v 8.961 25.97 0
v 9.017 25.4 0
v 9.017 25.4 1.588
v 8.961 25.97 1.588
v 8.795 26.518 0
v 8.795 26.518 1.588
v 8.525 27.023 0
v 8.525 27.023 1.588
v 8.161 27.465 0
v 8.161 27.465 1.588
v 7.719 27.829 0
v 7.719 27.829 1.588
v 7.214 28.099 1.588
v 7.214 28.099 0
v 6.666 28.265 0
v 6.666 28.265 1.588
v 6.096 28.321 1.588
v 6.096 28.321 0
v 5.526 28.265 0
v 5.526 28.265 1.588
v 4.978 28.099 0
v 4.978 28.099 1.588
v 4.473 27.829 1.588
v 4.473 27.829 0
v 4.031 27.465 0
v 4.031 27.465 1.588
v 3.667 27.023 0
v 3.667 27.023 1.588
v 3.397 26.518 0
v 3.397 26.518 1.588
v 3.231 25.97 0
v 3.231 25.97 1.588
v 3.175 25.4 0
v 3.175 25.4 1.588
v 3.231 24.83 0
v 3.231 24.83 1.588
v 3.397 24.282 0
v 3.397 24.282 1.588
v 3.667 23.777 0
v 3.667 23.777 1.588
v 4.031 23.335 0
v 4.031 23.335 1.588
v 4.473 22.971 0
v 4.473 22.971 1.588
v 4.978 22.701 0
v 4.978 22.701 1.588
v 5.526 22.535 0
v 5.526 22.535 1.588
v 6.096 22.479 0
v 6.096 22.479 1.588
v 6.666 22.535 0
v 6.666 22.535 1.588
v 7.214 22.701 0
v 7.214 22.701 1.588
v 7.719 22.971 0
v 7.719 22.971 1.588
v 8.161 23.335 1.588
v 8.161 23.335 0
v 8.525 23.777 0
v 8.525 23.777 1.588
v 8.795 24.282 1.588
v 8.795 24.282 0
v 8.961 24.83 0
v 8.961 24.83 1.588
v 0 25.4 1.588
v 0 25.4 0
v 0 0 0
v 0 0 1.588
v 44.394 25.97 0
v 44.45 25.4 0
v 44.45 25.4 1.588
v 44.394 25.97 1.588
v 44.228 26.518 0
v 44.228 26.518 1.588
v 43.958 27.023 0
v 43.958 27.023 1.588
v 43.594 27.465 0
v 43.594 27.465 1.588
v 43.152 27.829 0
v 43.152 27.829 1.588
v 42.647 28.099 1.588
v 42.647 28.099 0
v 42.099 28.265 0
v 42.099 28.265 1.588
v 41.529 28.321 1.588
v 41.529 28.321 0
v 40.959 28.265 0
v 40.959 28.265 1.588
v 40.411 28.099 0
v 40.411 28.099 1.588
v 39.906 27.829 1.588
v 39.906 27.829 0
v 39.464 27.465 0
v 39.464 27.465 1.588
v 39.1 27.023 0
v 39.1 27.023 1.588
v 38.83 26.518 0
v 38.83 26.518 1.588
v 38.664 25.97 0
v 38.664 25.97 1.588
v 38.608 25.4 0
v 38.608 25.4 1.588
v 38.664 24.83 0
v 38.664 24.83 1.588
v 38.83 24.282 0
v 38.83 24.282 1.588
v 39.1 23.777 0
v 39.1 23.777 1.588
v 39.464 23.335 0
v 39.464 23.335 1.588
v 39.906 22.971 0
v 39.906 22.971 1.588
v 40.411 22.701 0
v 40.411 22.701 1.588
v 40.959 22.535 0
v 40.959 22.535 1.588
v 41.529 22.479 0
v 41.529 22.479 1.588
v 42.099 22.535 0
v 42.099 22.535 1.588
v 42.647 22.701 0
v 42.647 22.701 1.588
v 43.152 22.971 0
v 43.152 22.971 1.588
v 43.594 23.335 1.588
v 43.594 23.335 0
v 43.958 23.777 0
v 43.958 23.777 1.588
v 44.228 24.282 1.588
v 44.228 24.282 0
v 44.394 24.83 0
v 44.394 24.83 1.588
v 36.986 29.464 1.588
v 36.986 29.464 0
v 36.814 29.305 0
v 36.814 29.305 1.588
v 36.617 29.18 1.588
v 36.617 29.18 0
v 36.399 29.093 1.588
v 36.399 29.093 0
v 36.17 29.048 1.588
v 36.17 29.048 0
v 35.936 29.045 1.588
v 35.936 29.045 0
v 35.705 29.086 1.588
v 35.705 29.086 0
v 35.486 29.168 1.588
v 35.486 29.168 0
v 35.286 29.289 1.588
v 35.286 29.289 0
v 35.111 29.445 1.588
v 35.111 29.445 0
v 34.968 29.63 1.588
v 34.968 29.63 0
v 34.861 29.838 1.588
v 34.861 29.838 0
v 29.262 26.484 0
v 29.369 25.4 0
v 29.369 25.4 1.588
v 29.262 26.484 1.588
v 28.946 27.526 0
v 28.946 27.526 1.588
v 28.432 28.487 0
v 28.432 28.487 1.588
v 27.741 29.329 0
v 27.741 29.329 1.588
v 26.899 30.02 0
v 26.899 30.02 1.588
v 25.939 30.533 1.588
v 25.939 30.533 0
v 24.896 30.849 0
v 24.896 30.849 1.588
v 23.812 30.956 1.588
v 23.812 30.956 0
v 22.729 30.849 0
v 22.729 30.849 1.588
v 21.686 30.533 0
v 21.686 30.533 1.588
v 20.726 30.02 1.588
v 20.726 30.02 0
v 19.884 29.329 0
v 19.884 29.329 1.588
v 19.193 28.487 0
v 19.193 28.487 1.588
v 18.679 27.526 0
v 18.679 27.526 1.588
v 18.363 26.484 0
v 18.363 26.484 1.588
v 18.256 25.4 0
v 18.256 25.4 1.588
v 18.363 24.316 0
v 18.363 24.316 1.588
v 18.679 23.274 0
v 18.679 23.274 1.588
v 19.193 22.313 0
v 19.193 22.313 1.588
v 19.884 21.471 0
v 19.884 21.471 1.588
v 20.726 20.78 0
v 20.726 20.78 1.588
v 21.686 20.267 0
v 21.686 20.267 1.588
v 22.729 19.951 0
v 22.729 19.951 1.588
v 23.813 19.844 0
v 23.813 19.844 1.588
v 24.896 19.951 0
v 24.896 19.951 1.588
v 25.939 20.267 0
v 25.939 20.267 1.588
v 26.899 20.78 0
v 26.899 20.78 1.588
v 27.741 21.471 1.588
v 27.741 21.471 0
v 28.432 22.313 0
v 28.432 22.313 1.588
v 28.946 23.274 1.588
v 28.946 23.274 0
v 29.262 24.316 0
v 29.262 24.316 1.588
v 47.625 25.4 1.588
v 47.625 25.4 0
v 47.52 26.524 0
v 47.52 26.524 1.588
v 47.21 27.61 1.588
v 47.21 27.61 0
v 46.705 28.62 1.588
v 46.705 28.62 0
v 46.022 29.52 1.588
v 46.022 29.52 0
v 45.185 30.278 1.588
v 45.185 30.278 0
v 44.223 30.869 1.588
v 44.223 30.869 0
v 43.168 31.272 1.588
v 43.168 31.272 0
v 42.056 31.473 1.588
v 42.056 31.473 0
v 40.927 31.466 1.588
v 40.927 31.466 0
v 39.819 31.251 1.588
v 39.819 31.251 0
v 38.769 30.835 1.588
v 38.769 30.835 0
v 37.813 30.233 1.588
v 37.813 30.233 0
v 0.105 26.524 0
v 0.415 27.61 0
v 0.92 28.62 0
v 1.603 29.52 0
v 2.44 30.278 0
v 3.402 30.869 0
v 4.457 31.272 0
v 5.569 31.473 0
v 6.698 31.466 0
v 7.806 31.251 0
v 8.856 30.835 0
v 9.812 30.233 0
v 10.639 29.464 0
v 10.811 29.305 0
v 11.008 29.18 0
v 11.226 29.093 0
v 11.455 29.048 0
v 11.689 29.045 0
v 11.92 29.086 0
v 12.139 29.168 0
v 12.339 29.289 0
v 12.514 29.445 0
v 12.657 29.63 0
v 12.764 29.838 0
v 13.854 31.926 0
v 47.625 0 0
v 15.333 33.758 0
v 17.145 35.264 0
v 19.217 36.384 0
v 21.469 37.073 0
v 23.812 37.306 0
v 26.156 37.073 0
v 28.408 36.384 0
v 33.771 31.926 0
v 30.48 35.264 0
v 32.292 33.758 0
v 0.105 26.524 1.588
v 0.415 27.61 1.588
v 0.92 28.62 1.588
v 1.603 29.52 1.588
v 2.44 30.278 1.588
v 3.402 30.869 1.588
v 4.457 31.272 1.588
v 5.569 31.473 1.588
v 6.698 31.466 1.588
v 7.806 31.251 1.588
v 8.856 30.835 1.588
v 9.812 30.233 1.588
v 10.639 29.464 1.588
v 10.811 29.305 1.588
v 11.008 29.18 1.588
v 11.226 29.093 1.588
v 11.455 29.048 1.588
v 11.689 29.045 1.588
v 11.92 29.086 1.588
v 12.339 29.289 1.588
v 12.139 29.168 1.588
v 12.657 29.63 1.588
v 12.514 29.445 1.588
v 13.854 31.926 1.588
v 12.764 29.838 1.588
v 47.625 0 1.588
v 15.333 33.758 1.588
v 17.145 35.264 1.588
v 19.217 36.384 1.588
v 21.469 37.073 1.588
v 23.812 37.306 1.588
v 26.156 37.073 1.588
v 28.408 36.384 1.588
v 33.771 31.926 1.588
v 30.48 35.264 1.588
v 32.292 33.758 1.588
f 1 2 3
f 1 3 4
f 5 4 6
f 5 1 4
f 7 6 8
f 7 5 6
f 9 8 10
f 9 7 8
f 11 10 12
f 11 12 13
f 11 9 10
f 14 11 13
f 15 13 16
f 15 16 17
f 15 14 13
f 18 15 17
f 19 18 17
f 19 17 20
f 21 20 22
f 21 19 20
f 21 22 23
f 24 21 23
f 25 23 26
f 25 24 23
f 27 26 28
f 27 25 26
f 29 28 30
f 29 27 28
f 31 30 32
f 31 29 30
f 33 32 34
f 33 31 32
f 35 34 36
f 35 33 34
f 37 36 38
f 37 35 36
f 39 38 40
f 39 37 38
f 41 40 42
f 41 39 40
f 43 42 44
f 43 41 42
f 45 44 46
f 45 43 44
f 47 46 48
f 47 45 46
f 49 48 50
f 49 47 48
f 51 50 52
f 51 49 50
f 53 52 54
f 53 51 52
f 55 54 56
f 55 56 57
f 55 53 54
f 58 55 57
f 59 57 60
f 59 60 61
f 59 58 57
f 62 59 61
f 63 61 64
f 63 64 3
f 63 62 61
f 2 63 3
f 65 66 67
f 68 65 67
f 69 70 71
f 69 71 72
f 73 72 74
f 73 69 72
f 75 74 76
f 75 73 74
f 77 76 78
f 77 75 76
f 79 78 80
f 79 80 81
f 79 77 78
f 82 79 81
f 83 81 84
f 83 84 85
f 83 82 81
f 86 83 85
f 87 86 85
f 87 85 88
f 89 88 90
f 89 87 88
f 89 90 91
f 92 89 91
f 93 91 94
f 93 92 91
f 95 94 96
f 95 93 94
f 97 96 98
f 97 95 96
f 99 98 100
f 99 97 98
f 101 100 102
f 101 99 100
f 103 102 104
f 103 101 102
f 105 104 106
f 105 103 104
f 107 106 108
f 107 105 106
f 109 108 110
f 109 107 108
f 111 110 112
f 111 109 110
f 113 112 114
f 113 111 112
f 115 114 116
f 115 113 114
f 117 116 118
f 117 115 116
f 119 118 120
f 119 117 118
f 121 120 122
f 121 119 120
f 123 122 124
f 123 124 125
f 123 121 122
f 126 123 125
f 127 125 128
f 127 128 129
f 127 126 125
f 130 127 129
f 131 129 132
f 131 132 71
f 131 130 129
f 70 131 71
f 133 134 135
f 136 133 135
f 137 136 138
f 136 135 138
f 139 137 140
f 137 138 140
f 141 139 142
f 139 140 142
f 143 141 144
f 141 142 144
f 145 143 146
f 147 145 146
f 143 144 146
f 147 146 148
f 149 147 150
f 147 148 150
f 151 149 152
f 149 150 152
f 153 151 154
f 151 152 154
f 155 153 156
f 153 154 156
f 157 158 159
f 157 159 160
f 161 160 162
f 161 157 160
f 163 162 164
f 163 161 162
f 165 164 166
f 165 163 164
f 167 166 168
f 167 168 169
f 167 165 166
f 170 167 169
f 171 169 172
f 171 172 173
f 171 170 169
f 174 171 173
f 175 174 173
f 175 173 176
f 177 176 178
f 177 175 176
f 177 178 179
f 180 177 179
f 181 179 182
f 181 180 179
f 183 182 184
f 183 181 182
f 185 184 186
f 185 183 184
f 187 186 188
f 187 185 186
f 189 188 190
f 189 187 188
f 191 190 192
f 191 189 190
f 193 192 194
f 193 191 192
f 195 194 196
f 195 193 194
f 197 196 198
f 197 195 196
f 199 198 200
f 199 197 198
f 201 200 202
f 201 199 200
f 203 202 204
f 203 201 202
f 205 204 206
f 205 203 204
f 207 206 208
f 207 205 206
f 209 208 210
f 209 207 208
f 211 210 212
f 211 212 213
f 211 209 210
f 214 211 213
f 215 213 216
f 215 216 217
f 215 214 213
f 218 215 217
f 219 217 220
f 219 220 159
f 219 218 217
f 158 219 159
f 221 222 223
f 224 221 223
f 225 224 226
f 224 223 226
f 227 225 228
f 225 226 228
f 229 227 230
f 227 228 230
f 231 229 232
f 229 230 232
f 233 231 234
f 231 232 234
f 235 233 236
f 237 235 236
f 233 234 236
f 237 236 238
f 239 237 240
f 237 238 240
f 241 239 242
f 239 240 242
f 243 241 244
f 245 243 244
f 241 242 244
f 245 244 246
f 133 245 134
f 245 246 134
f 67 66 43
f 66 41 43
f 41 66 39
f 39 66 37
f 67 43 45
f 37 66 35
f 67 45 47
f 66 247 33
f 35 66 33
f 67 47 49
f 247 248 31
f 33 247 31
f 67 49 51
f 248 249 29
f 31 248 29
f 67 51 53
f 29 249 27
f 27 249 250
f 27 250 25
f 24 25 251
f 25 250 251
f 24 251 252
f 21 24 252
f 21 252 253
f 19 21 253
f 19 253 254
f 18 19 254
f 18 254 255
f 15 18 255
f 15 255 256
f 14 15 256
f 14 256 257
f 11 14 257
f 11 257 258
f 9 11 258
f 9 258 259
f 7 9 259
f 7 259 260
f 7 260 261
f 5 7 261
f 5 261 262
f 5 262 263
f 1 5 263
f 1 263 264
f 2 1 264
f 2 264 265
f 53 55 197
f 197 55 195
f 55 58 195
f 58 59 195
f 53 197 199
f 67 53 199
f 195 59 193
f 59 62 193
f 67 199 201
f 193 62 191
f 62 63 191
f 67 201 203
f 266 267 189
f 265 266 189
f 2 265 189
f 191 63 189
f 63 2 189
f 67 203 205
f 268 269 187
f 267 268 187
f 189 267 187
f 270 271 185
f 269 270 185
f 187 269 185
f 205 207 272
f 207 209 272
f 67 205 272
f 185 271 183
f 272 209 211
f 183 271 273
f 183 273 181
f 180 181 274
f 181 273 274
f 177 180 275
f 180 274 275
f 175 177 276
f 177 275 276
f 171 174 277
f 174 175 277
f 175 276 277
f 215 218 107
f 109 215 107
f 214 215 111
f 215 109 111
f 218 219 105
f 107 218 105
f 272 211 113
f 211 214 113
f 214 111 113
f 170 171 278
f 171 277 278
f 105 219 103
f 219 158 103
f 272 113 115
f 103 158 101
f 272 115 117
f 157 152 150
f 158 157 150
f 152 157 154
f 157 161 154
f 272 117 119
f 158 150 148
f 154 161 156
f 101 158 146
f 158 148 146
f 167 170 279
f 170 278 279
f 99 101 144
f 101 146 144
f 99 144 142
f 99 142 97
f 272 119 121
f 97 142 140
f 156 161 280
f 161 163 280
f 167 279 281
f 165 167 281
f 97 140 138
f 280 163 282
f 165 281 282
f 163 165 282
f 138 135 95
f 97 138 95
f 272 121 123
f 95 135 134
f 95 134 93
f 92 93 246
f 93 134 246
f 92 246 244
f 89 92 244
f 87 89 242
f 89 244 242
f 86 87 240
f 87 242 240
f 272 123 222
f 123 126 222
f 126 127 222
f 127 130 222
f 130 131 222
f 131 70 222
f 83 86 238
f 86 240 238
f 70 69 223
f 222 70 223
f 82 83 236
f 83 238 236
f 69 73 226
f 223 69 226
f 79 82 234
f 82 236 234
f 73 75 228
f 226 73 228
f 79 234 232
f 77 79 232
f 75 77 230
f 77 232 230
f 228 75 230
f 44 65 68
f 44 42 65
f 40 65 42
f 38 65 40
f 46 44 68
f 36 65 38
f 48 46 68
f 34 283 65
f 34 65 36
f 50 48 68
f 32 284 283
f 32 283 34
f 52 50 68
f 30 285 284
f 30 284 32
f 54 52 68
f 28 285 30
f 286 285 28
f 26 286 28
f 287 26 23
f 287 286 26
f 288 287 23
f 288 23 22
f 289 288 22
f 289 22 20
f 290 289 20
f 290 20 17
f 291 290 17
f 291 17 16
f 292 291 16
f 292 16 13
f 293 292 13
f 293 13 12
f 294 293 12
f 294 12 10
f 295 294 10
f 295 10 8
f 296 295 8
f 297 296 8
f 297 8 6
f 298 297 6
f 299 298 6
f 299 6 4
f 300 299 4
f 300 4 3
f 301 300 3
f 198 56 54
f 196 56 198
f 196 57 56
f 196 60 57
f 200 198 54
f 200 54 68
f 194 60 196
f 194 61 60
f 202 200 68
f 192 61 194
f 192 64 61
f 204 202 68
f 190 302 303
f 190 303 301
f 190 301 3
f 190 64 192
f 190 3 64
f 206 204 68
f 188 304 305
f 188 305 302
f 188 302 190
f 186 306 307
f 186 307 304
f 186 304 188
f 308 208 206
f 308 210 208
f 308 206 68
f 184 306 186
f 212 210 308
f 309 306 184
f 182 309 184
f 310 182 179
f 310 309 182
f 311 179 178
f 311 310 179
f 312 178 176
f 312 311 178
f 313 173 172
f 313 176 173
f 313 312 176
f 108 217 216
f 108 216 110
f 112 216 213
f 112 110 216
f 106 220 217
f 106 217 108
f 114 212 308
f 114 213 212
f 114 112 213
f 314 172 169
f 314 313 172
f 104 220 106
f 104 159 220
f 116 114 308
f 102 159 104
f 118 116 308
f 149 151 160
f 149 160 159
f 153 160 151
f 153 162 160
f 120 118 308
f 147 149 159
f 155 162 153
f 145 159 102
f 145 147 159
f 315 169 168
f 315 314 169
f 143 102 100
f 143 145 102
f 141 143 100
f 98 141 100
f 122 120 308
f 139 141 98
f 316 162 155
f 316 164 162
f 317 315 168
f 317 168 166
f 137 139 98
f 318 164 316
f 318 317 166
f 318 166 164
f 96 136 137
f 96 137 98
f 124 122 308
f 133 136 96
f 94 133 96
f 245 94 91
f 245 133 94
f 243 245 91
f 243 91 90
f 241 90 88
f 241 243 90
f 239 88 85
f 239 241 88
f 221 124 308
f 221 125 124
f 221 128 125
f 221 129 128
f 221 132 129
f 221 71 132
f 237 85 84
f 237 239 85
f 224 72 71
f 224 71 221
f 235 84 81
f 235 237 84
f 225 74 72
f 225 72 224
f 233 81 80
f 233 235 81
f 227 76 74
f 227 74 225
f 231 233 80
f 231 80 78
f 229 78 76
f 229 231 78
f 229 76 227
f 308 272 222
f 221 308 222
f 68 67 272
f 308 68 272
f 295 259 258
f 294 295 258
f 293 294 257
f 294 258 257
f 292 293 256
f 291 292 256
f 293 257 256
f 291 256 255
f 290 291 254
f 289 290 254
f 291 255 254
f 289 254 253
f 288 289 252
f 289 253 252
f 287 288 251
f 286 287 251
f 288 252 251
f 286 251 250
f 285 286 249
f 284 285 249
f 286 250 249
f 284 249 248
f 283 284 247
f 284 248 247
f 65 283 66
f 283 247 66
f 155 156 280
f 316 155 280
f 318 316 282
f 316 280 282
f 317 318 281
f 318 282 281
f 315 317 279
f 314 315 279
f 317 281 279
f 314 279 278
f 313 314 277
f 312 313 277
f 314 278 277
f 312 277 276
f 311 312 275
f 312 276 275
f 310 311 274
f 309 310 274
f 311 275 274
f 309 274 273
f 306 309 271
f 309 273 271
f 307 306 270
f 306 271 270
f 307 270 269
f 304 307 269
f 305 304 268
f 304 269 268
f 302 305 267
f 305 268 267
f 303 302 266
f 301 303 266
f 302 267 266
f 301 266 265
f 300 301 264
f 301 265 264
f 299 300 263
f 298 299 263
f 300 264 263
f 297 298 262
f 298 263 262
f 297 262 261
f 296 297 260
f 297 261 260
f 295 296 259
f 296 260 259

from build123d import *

# Parameters (mm, degrees)
SKETCH1_R           = 5.55625
SKETCH1_R_2         = 2.921
BOSS_EXTRUDE1_DEPTH = 1.5875


with BuildPart() as part:
    # Sketch1 → Boss-Extrude1 (new body)
    with BuildSketch(Plane.XY):
        with BuildLine():
            Line((0, 0), (47.625, 0))
            Line((47.625, 0), (47.625, 25.4))
            ThreePointArc((47.625, 25.4), (43.704494442, 31.094597434), (36.985748053, 29.464489851))
            ThreePointArc((36.985748053, 29.464489851), (35.819445625, 29.06042219), (34.860756534, 29.83788425))
            ThreePointArc((34.860756534, 29.83788425), (23.8125, 37.30625), (12.764243466, 29.83788425))
            ThreePointArc((12.764243466, 29.83788425), (11.805554375, 29.06042219), (10.639251947, 29.464489851))
            ThreePointArc((10.639251947, 29.464489851), (3.920505558, 31.094597434), (0, 25.4))
            Line((0, 25.4), (0, 0))
        make_face()
        with Locations((23.8125, 25.4)):
            Circle(SKETCH1_R, mode=Mode.SUBTRACT)
        with Locations((6.096, 25.4)):
            Circle(SKETCH1_R_2, mode=Mode.SUBTRACT)
        with Locations((41.529, 25.4)):
            Circle(SKETCH1_R_2, mode=Mode.SUBTRACT)
    extrude(amount=BOSS_EXTRUDE1_DEPTH)


solid = part.part
